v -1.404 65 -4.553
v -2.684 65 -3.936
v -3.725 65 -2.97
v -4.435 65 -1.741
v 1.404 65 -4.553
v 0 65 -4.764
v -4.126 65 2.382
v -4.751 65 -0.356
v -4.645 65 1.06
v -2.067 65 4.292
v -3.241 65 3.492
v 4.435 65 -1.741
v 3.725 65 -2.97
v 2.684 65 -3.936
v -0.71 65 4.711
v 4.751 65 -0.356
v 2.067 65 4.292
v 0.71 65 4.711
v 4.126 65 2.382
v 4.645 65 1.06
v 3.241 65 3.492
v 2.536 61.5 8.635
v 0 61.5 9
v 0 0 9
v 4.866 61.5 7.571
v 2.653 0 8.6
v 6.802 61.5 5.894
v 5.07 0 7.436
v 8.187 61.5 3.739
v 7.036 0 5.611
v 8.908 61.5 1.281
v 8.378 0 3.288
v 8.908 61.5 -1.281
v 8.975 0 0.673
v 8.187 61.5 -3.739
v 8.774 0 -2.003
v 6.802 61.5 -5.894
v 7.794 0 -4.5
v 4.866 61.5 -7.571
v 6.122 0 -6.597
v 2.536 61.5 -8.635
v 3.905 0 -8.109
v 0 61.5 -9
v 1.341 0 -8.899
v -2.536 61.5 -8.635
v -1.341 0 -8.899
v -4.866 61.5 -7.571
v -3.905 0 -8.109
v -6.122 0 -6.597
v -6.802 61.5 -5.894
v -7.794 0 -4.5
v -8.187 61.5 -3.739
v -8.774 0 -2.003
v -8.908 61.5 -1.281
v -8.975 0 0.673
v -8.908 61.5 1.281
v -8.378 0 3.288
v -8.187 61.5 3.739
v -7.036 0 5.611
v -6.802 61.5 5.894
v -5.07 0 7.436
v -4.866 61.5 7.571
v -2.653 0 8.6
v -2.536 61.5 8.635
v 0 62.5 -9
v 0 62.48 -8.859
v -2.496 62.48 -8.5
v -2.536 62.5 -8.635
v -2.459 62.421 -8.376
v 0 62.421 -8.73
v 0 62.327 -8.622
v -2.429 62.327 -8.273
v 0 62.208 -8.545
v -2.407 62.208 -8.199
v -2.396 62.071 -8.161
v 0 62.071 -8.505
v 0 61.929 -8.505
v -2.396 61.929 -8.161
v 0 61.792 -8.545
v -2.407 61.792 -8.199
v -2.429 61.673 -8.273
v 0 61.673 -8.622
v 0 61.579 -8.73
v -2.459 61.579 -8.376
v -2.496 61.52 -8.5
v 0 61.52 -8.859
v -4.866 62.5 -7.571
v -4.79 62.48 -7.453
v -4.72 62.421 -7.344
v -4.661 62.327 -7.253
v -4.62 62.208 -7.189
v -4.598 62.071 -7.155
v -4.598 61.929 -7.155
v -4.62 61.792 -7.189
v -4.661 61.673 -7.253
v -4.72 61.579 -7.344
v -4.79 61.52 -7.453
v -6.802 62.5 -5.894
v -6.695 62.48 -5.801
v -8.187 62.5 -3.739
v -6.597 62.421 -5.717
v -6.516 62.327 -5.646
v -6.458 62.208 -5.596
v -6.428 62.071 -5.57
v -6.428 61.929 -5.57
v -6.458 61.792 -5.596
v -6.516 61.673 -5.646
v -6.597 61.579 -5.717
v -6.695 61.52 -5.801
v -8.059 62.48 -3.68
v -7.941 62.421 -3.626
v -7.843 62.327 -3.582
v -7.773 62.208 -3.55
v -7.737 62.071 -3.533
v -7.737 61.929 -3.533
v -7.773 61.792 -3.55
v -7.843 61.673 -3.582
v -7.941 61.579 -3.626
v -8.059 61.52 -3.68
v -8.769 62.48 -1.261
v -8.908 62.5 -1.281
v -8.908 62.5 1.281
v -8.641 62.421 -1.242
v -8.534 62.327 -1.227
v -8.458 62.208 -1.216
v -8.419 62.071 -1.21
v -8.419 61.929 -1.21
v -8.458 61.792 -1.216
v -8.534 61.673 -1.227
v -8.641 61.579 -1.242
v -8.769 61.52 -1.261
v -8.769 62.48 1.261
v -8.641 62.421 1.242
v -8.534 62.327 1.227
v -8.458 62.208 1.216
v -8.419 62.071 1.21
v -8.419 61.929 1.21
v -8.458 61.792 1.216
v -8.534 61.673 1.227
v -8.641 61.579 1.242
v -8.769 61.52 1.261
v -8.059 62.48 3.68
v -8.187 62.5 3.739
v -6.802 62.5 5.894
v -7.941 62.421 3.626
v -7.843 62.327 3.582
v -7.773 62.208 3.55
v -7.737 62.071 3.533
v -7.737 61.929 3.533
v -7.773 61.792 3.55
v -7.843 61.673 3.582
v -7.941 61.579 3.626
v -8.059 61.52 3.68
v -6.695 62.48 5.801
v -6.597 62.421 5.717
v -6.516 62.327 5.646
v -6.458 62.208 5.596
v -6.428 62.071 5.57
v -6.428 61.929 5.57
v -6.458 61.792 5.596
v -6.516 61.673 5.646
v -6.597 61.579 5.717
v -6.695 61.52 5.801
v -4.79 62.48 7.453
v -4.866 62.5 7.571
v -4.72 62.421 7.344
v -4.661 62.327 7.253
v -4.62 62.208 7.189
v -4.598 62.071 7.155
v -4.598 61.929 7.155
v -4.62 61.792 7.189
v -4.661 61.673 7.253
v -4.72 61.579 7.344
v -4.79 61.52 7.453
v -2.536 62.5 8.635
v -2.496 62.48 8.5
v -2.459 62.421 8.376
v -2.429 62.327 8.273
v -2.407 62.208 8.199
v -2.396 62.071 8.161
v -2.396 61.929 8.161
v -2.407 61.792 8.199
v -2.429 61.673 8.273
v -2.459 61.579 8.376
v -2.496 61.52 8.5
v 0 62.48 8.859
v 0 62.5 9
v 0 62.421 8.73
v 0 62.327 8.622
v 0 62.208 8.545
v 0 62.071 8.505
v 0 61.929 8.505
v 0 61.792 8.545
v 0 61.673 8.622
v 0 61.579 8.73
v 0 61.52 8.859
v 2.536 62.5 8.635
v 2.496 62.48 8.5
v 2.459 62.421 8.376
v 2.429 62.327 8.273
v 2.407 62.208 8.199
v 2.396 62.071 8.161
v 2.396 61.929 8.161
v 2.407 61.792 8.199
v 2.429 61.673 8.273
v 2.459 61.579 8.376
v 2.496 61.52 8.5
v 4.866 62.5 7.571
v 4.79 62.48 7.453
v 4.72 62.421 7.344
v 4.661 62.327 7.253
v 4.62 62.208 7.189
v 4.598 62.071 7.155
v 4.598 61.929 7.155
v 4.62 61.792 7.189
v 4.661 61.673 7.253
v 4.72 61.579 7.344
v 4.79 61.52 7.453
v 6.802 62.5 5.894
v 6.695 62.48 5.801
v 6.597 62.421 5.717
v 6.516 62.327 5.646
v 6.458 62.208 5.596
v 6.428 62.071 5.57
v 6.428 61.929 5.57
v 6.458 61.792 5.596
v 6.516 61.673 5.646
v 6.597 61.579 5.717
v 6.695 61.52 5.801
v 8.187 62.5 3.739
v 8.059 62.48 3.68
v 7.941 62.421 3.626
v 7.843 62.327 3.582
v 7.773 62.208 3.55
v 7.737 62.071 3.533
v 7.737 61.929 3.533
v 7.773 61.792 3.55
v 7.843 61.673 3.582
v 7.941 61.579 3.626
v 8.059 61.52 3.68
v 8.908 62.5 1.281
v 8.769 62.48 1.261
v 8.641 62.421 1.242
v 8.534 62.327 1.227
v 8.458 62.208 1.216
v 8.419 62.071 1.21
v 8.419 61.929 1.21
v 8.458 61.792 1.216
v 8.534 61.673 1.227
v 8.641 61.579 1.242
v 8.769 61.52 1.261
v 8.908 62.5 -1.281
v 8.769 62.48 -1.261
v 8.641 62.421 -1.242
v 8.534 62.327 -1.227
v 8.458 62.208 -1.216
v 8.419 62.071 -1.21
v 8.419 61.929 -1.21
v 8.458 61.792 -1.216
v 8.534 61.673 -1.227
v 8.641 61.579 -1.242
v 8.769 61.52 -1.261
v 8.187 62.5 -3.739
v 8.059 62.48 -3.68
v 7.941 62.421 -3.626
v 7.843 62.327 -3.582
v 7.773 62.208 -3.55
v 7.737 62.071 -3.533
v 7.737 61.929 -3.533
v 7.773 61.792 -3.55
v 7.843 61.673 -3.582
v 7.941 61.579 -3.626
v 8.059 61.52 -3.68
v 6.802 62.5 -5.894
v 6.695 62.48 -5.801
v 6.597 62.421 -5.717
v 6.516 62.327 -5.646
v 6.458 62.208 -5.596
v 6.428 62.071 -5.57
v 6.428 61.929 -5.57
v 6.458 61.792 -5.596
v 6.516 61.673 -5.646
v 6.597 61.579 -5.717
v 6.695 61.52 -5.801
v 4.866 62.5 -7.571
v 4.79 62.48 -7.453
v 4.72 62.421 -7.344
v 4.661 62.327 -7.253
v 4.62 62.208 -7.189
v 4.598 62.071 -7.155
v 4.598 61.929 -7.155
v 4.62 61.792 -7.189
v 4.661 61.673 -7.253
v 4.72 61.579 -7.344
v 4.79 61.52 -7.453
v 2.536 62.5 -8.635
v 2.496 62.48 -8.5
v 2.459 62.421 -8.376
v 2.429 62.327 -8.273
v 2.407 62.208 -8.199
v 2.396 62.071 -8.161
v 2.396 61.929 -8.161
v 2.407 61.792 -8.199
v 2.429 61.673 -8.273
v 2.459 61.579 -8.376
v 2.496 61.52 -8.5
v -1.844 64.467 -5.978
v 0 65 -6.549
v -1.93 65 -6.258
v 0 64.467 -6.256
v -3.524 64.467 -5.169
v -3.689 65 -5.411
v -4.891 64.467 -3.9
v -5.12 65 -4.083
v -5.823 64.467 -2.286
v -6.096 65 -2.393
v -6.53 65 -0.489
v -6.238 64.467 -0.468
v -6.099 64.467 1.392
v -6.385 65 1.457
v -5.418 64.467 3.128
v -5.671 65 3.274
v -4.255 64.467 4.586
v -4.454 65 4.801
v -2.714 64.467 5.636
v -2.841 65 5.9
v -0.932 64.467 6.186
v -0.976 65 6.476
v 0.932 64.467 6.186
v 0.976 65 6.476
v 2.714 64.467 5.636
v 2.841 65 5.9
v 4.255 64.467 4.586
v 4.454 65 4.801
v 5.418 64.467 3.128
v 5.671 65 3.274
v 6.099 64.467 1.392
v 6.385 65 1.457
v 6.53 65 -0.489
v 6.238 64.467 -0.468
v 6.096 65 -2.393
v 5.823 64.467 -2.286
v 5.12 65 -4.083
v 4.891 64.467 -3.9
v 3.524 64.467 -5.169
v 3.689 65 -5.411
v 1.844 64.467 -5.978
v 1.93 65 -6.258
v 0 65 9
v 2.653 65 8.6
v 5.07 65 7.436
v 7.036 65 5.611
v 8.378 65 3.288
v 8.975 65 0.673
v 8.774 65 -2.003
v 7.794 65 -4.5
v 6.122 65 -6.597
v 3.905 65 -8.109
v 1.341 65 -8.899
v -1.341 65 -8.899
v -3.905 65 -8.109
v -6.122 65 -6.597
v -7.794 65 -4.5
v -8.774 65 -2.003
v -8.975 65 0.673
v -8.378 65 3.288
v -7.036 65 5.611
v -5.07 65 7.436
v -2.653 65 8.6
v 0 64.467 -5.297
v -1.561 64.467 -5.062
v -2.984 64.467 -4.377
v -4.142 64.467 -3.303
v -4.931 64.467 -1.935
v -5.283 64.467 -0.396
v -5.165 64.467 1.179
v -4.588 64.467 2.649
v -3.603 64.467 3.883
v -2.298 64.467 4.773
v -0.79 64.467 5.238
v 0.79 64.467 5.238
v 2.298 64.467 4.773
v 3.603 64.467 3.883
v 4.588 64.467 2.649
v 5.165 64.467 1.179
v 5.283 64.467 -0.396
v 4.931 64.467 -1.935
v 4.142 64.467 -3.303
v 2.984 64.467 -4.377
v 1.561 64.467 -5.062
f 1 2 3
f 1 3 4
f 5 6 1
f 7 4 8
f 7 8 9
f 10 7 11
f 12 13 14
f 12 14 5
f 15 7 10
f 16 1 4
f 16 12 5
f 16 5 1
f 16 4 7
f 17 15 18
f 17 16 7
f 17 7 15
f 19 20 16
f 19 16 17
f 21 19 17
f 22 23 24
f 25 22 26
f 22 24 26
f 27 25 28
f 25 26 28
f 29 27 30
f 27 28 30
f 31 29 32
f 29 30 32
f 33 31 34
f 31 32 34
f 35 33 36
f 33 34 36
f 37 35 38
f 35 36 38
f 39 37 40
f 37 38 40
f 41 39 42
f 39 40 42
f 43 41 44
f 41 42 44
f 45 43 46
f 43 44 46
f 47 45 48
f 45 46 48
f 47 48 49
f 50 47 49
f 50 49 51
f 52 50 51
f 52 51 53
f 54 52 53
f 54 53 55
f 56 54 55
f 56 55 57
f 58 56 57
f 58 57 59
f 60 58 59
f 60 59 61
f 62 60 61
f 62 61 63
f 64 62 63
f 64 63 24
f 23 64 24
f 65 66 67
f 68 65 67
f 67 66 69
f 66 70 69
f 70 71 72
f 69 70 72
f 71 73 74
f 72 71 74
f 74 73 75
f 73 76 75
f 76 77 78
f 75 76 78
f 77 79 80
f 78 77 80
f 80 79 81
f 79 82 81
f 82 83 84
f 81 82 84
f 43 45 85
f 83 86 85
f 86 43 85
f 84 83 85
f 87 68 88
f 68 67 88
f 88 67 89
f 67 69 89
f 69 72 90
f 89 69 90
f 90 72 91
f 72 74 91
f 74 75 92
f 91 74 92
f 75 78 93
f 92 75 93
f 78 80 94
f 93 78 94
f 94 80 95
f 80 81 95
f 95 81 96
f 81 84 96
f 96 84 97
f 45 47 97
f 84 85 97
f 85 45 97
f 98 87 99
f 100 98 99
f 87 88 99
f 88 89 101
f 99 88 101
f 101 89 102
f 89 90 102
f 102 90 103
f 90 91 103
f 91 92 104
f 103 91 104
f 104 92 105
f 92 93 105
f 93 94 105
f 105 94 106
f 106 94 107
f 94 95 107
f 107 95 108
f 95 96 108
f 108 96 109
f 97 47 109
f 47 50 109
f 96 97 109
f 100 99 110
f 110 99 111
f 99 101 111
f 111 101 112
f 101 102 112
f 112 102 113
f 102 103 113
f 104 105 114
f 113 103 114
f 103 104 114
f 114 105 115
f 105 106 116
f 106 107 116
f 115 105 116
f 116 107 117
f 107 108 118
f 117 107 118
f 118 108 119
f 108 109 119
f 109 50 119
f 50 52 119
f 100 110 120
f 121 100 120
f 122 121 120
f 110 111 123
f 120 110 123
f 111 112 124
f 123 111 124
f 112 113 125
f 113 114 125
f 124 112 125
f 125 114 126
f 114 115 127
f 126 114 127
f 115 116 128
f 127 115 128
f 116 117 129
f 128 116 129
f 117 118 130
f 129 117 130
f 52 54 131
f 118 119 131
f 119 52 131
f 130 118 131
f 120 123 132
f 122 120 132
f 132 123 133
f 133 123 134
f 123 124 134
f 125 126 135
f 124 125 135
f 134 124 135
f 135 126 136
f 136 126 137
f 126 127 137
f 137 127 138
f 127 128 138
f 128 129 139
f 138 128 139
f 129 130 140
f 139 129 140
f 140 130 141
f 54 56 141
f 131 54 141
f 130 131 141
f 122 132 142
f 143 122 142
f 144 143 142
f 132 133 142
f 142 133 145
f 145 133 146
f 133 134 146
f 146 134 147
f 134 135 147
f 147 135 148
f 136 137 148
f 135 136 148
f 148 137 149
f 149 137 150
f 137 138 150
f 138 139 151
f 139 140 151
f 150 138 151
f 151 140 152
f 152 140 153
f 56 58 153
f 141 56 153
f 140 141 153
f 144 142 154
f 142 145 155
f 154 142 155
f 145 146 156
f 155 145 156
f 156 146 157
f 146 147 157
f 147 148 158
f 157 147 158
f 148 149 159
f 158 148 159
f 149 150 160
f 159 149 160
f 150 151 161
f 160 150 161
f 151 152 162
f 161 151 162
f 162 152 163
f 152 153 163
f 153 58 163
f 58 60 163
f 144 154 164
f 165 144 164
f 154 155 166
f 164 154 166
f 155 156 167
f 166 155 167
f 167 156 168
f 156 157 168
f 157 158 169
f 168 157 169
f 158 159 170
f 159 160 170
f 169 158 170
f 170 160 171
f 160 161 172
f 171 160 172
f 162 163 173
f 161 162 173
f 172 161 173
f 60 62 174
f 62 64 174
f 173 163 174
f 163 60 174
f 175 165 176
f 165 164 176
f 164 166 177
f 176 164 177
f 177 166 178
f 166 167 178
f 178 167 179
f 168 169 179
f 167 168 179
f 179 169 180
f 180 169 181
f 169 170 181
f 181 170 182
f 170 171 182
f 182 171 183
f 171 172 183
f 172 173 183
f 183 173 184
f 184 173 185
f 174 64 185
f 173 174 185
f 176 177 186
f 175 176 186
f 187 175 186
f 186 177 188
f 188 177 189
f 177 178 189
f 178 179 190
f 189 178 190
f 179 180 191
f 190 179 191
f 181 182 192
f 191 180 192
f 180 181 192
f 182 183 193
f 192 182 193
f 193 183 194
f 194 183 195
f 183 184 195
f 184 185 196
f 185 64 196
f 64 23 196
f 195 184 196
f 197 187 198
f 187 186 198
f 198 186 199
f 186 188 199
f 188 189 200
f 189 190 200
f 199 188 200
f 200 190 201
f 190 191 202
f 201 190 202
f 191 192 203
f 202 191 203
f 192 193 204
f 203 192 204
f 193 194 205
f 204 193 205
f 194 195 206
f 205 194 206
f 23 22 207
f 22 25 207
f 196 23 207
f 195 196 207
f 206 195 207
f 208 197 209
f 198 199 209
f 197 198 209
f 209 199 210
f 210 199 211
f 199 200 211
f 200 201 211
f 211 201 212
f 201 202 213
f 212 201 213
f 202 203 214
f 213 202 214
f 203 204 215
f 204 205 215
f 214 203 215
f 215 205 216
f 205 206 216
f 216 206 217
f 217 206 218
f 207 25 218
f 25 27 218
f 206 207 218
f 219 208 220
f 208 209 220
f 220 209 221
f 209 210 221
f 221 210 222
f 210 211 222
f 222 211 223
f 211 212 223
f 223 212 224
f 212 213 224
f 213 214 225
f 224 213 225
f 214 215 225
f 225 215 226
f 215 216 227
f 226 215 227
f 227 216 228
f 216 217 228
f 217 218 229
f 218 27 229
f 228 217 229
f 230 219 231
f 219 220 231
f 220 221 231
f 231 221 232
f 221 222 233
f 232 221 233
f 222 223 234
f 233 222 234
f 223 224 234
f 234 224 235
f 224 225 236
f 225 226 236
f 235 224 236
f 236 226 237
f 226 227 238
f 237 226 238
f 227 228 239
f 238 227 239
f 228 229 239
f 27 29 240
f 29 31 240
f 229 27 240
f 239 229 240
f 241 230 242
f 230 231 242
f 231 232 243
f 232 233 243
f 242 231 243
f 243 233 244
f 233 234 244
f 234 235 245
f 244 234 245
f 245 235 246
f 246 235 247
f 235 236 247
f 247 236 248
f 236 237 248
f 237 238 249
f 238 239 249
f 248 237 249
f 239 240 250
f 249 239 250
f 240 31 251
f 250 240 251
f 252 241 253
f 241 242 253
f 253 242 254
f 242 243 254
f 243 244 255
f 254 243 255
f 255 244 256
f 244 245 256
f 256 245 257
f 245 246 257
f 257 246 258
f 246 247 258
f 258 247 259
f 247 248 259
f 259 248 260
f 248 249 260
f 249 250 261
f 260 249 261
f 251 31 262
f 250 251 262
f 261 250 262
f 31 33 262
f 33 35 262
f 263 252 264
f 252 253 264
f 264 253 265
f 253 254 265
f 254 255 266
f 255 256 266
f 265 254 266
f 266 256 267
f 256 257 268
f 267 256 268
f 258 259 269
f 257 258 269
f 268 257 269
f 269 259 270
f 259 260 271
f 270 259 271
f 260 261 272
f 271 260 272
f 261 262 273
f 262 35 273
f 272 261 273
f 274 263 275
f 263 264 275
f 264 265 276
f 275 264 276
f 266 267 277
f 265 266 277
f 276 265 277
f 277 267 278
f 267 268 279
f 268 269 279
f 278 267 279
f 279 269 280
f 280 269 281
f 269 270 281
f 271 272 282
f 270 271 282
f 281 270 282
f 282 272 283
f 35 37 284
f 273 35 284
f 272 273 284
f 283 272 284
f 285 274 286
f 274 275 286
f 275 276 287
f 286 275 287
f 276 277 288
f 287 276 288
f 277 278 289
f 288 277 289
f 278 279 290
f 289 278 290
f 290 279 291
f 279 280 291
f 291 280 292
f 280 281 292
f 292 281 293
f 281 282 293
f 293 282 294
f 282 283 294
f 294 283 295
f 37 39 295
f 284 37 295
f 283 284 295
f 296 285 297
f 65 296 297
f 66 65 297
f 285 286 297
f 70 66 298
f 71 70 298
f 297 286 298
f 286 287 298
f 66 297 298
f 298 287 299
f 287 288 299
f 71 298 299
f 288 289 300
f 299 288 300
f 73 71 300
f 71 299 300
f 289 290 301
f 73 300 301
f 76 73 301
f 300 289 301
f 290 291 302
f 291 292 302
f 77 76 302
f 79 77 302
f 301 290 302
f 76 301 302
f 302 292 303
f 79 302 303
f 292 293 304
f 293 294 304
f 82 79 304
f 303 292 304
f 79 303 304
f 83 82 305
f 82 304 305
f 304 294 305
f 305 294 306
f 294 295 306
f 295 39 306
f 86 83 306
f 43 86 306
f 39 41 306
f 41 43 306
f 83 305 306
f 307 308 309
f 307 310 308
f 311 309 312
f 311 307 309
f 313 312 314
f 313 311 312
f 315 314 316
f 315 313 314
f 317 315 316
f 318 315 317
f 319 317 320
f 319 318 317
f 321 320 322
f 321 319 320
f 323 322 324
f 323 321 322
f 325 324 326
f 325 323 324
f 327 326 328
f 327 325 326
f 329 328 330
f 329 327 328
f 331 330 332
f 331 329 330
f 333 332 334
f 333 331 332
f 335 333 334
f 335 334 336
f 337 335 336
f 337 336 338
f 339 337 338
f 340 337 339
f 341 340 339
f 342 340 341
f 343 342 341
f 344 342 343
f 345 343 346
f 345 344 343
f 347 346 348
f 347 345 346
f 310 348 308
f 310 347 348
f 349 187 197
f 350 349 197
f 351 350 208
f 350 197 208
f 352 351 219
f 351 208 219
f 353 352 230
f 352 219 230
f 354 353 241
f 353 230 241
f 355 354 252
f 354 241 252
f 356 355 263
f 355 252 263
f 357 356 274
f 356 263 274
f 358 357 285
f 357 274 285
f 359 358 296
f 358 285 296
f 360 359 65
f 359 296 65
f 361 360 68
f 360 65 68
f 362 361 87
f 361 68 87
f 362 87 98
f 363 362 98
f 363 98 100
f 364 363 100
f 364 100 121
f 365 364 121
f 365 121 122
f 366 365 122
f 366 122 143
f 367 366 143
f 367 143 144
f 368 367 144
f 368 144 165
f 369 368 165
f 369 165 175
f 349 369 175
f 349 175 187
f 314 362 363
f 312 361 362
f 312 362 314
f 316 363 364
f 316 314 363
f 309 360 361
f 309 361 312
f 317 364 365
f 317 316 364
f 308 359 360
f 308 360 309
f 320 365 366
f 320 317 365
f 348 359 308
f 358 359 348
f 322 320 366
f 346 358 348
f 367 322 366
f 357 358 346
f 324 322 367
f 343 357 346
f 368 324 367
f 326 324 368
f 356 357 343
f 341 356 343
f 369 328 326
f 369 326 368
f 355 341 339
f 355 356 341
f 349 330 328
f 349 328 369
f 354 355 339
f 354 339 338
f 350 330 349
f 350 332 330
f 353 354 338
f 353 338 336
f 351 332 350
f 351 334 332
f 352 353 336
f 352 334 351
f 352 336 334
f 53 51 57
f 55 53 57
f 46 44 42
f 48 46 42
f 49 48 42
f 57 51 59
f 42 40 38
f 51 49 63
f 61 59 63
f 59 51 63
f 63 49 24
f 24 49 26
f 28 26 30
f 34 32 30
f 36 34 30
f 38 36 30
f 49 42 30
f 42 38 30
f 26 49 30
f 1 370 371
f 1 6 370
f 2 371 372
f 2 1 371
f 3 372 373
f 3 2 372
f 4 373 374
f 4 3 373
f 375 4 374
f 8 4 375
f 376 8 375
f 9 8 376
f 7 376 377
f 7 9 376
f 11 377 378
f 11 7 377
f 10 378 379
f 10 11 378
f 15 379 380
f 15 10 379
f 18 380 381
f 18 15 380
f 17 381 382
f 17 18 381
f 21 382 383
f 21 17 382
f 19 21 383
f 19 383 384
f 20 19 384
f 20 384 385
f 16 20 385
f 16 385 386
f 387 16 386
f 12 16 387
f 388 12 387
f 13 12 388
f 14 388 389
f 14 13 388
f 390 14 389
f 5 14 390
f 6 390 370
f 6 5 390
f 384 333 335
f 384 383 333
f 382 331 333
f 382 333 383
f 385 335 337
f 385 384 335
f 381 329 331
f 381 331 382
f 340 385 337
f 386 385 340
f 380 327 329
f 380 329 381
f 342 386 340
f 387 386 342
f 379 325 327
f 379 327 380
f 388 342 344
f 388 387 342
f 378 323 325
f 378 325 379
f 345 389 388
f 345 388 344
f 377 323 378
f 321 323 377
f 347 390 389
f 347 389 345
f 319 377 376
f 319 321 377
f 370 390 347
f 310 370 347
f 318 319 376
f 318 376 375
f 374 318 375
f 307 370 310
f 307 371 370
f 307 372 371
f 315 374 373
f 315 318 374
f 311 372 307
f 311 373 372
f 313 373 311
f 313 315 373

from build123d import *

# Parameters (mm, degrees)
SKETCH1_R           = 9
BOSS_EXTRUDE1_DEPTH = 65
SKETCH2_R           = 0.5


with BuildPart() as part:
    # Sketch1 → Boss-Extrude1 (new body)
    with BuildSketch(Plane(origin=(0, 0, 0), x_dir=(1, 0, 0), z_dir=(0, 1, 0))):
        with Locations(Location((0, 0, 0), (0, 0, 270))):
            Circle(SKETCH1_R)
    extrude(amount=BOSS_EXTRUDE1_DEPTH)

    # Sketch2 → Cut-Revolve1 (revolve, cut)
    with BuildSketch(Plane(origin=(0, 0, 0), x_dir=(0, 0, -1), z_dir=(1, 0, 0))):
        with Locations((9, 62)):
            Circle(SKETCH2_R)
        Polygon((6.548746469, 65), (6.255894625, 64.46676314), (5.297470411, 64.46676314), (4.76423355, 65), align=None)
    revolve(axis=Axis((0, 0, 0), (0, 1, 0)), mode=Mode.SUBTRACT)


solid = part.part
